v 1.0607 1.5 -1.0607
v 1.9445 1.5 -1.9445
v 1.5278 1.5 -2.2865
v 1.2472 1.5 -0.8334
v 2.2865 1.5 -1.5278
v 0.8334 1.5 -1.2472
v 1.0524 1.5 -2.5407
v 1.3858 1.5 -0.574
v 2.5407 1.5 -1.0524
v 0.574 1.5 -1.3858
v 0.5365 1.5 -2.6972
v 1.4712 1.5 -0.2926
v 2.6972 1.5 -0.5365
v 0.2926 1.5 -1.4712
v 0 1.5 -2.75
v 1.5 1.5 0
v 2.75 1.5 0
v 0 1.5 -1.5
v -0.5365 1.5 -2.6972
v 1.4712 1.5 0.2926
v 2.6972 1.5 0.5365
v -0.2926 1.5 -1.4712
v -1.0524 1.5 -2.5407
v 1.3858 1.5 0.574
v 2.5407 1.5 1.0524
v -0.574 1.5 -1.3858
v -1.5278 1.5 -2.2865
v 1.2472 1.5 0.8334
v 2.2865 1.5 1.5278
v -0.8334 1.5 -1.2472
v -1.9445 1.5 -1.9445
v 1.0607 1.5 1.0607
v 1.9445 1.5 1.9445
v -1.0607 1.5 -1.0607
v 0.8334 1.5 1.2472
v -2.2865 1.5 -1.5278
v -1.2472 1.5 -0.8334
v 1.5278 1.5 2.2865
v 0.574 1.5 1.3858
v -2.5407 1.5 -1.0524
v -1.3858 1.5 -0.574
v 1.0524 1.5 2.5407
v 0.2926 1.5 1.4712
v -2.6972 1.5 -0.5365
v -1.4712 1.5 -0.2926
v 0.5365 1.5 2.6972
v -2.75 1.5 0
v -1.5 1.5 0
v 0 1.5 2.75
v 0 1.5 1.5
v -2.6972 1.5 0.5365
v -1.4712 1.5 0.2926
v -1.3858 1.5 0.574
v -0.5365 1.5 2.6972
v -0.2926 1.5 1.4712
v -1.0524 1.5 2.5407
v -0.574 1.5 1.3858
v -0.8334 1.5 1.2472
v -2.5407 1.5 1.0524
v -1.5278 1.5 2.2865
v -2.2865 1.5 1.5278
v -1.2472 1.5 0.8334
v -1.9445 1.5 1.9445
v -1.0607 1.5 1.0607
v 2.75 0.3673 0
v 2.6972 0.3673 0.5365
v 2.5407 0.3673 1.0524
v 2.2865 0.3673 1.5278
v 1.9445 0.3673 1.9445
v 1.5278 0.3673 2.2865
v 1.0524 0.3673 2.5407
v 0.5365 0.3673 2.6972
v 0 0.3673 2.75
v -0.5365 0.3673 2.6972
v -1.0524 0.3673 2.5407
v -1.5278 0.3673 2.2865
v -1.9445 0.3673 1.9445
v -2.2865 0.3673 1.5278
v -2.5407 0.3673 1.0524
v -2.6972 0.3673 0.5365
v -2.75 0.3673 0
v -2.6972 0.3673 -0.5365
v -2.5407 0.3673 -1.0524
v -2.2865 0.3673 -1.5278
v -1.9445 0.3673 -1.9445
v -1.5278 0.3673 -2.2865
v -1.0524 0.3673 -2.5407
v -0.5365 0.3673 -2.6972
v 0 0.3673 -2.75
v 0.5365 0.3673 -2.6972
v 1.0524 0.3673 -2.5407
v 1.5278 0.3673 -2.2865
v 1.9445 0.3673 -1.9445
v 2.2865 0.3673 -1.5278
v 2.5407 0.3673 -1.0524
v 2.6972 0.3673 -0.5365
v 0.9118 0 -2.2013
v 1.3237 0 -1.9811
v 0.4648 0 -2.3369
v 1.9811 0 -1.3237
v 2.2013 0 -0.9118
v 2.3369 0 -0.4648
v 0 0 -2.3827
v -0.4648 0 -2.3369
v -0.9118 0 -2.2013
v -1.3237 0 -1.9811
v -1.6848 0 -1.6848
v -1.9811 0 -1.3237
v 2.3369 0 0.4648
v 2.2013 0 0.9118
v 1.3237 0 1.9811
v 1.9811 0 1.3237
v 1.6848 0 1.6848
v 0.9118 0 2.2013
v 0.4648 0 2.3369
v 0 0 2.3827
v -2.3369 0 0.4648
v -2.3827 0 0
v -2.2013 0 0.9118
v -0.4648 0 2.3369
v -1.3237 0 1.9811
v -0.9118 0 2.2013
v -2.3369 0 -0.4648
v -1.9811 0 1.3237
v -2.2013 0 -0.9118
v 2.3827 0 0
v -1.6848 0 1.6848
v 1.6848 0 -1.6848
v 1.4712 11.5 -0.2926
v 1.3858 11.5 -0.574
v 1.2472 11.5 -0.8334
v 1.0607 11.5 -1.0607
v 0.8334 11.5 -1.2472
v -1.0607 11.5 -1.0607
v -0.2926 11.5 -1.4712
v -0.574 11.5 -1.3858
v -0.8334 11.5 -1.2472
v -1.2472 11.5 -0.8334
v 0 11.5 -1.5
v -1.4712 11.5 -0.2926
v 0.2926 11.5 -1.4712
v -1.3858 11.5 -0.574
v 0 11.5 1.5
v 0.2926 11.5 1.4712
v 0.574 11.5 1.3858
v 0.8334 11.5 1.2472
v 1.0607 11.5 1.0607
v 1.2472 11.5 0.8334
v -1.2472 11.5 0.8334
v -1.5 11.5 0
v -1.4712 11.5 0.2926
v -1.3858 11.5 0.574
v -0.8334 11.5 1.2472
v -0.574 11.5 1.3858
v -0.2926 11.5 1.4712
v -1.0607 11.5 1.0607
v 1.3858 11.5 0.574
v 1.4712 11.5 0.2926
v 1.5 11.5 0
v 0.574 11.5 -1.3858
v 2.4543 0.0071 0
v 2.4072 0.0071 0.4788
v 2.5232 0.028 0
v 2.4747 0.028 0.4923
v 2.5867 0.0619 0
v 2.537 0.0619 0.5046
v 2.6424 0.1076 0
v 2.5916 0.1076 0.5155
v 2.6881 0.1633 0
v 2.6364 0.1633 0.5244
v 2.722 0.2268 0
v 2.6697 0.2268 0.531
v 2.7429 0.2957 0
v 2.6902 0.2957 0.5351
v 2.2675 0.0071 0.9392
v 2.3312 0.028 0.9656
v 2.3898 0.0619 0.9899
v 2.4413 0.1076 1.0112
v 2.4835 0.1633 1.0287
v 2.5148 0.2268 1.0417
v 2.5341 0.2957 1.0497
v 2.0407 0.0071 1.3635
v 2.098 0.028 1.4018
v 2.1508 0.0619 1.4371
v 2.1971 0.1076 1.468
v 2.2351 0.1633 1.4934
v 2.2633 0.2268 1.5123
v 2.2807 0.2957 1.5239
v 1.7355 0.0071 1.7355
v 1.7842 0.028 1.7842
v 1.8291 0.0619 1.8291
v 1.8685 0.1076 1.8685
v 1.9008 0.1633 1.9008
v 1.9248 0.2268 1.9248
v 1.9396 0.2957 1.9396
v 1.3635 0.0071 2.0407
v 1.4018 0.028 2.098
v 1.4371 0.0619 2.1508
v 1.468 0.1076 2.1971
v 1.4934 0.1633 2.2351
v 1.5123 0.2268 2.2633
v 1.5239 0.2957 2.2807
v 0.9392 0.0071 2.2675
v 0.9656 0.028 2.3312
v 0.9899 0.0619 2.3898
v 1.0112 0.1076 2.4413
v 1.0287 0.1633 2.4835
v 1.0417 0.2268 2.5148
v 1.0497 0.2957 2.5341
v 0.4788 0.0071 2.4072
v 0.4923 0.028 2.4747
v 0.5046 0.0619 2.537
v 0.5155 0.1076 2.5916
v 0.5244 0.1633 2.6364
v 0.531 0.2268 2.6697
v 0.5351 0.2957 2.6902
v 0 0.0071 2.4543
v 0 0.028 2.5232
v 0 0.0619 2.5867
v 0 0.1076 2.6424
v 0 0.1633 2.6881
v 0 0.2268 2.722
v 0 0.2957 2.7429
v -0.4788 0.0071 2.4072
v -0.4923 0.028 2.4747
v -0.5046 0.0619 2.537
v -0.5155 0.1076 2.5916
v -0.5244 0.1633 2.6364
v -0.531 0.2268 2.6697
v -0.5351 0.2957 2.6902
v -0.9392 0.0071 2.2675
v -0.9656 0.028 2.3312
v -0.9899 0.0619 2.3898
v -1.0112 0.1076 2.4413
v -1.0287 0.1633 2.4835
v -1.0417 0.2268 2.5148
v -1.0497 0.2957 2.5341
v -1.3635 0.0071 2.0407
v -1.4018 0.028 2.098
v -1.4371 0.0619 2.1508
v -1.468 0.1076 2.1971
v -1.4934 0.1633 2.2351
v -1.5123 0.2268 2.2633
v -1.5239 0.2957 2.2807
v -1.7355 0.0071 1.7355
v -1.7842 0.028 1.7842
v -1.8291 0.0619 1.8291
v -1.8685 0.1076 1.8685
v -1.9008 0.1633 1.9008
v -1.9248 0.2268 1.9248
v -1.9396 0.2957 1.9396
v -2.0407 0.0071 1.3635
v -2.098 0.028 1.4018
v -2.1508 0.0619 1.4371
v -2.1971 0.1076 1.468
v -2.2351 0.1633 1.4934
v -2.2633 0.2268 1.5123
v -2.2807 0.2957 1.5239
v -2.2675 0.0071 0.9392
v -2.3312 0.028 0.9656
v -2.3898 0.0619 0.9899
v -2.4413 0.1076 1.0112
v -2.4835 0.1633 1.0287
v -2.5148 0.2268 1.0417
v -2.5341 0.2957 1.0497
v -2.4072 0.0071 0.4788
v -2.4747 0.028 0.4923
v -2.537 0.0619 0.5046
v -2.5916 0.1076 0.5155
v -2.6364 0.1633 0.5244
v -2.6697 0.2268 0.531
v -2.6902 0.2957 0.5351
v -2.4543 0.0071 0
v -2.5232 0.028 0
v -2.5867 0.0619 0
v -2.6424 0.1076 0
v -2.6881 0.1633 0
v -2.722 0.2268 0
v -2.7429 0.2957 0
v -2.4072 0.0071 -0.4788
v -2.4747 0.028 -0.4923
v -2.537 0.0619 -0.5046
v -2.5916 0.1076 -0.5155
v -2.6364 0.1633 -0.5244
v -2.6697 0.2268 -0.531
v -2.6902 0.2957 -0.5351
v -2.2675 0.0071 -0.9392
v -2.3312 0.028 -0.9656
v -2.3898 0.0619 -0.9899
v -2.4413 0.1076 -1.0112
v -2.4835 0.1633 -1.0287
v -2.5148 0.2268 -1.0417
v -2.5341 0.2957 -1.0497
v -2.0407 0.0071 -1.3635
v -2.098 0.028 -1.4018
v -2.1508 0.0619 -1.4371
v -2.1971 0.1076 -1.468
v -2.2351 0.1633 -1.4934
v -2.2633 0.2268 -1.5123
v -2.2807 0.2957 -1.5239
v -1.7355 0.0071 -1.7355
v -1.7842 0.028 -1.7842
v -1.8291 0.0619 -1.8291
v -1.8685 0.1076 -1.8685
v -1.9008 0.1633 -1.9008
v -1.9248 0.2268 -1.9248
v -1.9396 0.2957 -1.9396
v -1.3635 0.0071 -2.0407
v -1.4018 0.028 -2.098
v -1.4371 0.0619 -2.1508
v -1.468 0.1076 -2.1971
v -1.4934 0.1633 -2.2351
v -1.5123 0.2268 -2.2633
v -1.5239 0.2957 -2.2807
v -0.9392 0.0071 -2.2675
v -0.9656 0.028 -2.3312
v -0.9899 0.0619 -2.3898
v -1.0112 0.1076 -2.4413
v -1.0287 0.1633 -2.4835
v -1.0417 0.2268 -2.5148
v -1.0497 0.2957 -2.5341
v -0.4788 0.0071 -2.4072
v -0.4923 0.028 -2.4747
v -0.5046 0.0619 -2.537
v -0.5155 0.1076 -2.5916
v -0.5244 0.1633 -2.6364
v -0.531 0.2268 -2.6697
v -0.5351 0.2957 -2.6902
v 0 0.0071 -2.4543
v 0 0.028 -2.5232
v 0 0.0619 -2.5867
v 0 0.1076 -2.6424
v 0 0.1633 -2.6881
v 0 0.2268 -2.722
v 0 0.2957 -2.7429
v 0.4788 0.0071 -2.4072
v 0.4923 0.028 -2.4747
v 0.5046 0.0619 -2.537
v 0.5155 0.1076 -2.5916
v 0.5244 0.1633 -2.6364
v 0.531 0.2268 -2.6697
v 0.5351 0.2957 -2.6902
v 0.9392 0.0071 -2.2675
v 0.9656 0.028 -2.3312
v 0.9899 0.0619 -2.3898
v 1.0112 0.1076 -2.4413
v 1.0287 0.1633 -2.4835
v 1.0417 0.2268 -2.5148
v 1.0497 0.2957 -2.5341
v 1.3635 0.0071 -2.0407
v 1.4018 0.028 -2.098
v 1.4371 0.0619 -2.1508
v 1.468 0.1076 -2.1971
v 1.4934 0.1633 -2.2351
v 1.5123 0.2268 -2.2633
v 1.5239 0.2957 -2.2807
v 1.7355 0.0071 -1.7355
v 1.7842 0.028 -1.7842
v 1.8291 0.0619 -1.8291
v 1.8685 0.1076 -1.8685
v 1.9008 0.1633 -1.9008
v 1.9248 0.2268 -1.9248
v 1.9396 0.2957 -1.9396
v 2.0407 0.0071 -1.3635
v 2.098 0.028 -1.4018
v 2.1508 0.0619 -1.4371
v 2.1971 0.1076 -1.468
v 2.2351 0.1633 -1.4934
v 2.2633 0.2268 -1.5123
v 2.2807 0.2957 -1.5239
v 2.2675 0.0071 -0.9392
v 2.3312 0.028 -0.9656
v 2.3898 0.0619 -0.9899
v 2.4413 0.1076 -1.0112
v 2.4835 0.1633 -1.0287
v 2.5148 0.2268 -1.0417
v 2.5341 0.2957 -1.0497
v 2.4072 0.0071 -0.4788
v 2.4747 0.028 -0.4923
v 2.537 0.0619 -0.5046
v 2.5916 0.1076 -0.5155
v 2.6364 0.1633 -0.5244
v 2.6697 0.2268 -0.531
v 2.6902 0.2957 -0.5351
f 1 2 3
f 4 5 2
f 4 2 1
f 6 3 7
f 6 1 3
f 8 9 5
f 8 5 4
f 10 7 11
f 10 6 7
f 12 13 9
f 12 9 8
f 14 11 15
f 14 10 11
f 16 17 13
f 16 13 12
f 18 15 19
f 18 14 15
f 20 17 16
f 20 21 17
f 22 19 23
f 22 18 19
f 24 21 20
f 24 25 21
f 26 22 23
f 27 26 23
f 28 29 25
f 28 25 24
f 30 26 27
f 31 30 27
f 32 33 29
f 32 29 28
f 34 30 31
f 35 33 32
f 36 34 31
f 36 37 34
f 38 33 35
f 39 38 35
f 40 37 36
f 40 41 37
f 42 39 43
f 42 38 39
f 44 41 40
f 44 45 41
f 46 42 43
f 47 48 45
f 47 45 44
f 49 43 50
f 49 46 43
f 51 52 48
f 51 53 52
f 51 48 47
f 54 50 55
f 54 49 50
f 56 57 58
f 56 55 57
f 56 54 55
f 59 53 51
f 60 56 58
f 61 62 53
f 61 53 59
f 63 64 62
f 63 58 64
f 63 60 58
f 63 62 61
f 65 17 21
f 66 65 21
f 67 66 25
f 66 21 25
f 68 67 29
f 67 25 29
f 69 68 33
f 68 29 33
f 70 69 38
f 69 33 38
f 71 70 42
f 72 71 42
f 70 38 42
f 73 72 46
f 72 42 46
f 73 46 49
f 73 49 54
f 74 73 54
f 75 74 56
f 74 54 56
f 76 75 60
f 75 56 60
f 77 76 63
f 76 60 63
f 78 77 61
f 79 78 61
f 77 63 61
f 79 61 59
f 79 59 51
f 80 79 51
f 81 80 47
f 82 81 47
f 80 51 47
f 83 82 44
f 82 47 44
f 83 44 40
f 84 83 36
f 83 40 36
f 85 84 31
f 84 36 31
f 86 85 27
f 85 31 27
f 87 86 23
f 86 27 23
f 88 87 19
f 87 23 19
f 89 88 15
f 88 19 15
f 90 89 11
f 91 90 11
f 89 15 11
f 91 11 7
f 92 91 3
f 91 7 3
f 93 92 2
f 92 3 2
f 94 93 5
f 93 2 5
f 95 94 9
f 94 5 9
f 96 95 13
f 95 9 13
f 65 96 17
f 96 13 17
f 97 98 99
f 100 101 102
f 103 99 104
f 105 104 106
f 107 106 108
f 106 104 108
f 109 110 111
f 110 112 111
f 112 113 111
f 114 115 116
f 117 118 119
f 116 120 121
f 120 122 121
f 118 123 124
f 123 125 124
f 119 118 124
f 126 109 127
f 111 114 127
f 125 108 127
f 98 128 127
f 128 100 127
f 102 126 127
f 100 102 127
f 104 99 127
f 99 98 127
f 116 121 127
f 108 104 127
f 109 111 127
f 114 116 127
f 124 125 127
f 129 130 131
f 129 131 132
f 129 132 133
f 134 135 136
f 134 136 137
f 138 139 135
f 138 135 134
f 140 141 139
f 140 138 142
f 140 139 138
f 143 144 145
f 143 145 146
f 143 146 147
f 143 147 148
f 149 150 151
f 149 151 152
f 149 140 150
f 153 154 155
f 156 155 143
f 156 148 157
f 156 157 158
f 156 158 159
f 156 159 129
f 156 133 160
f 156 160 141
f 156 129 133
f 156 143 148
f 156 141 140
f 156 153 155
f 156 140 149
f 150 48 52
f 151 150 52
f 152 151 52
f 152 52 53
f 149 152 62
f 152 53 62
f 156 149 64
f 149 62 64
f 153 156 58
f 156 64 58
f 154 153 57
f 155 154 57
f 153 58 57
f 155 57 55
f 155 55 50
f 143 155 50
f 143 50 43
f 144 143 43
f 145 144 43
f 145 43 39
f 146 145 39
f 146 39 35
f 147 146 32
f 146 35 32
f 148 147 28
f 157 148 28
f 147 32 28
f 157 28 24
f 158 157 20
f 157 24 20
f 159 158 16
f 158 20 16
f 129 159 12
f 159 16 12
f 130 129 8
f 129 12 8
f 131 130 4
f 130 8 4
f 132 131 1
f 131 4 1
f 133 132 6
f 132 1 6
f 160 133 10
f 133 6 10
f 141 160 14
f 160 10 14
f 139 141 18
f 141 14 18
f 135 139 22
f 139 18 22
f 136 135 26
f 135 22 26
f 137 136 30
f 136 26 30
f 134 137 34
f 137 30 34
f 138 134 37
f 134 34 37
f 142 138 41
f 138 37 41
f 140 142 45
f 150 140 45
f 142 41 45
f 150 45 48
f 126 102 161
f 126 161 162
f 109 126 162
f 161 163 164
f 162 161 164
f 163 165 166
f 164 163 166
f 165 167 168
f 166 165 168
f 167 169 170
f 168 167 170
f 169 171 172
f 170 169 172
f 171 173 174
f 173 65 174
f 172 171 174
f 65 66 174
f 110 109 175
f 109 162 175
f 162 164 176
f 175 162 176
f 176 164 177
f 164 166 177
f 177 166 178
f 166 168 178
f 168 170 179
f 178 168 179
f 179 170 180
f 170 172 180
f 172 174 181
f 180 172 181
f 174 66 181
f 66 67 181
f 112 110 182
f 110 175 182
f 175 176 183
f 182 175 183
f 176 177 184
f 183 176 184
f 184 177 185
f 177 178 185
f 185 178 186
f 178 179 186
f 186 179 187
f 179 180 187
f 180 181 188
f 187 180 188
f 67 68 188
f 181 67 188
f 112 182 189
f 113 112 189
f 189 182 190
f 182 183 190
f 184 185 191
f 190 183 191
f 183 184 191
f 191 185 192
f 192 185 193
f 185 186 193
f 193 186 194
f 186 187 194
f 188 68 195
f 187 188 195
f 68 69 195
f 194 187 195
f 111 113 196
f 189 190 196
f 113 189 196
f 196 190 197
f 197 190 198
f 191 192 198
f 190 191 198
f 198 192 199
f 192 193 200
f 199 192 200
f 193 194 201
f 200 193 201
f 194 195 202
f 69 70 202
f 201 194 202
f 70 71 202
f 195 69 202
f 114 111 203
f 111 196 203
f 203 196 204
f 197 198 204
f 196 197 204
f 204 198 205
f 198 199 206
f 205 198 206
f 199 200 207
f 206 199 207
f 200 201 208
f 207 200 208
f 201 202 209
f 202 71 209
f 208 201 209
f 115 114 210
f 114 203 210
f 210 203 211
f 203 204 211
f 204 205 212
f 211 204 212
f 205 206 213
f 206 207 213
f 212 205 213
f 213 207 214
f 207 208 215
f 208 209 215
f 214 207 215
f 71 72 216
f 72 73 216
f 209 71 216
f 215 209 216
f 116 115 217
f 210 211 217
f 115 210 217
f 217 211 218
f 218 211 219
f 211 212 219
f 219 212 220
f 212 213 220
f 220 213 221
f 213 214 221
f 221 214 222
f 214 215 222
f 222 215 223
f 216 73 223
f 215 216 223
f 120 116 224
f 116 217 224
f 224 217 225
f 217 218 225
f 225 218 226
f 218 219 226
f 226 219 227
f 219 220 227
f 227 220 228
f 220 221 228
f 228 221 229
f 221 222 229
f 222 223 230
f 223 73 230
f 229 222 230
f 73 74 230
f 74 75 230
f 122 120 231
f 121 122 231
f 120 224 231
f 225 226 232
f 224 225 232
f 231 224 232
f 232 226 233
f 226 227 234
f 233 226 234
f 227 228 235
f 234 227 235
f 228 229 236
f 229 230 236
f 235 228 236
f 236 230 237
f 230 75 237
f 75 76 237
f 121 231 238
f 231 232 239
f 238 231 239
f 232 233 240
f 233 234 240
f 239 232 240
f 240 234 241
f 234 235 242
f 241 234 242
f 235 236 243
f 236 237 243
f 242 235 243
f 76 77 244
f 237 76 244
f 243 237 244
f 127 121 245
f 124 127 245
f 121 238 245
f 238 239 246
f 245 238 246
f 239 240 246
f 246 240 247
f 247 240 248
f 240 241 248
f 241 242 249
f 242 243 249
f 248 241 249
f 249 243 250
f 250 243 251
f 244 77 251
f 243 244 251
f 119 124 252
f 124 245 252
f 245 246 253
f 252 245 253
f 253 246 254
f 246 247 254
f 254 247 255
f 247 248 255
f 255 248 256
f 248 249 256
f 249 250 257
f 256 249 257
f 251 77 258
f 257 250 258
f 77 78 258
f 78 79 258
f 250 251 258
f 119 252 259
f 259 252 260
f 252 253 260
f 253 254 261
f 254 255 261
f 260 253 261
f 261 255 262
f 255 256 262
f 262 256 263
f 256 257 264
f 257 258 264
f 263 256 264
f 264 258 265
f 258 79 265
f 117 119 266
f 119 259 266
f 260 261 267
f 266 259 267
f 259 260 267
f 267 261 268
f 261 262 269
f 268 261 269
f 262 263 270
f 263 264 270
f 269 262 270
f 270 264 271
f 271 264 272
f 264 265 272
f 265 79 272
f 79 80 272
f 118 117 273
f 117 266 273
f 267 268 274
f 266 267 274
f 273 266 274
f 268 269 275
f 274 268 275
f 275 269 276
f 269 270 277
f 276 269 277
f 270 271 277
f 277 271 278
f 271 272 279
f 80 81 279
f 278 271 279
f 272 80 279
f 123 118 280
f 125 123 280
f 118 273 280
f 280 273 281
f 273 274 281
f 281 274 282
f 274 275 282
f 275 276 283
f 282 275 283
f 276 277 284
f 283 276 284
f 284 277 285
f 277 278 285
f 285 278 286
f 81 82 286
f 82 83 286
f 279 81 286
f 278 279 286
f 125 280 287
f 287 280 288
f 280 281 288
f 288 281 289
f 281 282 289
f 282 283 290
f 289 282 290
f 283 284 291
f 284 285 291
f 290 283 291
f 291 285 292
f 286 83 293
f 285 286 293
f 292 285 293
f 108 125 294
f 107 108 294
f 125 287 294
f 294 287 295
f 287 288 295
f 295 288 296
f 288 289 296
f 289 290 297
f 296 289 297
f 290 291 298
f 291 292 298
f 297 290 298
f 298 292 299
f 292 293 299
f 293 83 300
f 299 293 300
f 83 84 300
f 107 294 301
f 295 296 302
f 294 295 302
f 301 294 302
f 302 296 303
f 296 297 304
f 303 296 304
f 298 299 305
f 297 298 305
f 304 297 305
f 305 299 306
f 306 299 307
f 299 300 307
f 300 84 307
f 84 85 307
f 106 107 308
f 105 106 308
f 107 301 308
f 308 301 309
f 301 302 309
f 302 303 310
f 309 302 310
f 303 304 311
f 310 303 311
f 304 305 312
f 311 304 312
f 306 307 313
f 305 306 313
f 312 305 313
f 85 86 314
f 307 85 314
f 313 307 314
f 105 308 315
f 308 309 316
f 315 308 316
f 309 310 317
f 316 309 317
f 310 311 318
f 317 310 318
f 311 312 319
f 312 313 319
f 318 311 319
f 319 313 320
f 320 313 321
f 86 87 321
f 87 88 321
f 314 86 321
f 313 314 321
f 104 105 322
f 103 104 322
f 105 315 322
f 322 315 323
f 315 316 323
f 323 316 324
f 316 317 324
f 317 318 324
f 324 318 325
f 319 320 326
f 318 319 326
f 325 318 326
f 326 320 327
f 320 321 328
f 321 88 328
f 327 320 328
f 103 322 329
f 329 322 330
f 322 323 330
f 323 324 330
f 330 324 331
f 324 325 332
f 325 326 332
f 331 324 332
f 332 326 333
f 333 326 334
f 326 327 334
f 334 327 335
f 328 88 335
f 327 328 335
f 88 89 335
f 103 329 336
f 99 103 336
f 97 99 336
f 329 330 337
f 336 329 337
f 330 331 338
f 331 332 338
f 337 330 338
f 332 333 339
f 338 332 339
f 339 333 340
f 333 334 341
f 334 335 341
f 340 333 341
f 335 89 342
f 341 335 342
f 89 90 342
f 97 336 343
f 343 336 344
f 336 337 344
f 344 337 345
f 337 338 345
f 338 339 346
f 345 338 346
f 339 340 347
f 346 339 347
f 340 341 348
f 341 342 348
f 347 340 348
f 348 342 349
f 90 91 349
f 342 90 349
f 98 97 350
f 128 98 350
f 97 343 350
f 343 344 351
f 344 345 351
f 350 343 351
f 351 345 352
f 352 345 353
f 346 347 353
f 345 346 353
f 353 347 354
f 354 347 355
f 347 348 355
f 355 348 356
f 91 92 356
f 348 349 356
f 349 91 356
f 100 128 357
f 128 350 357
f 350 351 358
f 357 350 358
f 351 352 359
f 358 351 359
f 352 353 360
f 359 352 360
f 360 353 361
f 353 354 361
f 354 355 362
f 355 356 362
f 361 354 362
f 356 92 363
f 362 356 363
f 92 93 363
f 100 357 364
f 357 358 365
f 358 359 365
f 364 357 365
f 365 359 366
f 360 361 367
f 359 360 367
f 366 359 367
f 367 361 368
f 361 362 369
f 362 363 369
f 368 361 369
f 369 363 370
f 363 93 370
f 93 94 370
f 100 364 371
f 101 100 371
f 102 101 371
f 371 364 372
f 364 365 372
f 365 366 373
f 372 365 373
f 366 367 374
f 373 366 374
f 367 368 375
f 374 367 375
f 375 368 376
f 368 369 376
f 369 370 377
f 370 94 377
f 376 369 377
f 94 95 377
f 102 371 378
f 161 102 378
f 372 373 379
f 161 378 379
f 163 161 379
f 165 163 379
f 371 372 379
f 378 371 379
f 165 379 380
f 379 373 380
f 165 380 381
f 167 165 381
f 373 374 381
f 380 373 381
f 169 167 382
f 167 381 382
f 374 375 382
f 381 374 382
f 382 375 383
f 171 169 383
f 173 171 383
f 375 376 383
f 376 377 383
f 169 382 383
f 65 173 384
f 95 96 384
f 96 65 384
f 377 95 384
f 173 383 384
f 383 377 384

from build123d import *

# Parameters (mm, degrees)
SKETCH_1_W      = 2.75
SKETCH_1_H      = 1.5
SKETCH_2_R      = 1.5
EXTRUDE_1_DEPTH = 10
FILLET_1_R      = 0.367346939


with BuildPart() as part:
    # 草图1 → 旋转1 (revolve)
    with BuildSketch(Plane.XY):
        with Locations((1.375, 0.75)):
            Rectangle(SKETCH_1_W, SKETCH_1_H)
    revolve(axis=Axis((0, 1.5, 0), (0, -1, 0)))

    # 草图2 → 凸台-拉伸1 (add)
    with BuildSketch(Plane(origin=(0, 1.5, 0), x_dir=(-1, 0, 0), z_dir=(0, 1, 0))):
        Circle(SKETCH_2_R)
    extrude(amount=EXTRUDE_1_DEPTH)

    # 圆角1
    fillet_1_edges = [part.edges().sort_by_distance(p)[0] for p in [
        (-2.75, 0, 0),
    ]]
    fillet(fillet_1_edges, radius=FILLET_1_R)


solid = part.part
